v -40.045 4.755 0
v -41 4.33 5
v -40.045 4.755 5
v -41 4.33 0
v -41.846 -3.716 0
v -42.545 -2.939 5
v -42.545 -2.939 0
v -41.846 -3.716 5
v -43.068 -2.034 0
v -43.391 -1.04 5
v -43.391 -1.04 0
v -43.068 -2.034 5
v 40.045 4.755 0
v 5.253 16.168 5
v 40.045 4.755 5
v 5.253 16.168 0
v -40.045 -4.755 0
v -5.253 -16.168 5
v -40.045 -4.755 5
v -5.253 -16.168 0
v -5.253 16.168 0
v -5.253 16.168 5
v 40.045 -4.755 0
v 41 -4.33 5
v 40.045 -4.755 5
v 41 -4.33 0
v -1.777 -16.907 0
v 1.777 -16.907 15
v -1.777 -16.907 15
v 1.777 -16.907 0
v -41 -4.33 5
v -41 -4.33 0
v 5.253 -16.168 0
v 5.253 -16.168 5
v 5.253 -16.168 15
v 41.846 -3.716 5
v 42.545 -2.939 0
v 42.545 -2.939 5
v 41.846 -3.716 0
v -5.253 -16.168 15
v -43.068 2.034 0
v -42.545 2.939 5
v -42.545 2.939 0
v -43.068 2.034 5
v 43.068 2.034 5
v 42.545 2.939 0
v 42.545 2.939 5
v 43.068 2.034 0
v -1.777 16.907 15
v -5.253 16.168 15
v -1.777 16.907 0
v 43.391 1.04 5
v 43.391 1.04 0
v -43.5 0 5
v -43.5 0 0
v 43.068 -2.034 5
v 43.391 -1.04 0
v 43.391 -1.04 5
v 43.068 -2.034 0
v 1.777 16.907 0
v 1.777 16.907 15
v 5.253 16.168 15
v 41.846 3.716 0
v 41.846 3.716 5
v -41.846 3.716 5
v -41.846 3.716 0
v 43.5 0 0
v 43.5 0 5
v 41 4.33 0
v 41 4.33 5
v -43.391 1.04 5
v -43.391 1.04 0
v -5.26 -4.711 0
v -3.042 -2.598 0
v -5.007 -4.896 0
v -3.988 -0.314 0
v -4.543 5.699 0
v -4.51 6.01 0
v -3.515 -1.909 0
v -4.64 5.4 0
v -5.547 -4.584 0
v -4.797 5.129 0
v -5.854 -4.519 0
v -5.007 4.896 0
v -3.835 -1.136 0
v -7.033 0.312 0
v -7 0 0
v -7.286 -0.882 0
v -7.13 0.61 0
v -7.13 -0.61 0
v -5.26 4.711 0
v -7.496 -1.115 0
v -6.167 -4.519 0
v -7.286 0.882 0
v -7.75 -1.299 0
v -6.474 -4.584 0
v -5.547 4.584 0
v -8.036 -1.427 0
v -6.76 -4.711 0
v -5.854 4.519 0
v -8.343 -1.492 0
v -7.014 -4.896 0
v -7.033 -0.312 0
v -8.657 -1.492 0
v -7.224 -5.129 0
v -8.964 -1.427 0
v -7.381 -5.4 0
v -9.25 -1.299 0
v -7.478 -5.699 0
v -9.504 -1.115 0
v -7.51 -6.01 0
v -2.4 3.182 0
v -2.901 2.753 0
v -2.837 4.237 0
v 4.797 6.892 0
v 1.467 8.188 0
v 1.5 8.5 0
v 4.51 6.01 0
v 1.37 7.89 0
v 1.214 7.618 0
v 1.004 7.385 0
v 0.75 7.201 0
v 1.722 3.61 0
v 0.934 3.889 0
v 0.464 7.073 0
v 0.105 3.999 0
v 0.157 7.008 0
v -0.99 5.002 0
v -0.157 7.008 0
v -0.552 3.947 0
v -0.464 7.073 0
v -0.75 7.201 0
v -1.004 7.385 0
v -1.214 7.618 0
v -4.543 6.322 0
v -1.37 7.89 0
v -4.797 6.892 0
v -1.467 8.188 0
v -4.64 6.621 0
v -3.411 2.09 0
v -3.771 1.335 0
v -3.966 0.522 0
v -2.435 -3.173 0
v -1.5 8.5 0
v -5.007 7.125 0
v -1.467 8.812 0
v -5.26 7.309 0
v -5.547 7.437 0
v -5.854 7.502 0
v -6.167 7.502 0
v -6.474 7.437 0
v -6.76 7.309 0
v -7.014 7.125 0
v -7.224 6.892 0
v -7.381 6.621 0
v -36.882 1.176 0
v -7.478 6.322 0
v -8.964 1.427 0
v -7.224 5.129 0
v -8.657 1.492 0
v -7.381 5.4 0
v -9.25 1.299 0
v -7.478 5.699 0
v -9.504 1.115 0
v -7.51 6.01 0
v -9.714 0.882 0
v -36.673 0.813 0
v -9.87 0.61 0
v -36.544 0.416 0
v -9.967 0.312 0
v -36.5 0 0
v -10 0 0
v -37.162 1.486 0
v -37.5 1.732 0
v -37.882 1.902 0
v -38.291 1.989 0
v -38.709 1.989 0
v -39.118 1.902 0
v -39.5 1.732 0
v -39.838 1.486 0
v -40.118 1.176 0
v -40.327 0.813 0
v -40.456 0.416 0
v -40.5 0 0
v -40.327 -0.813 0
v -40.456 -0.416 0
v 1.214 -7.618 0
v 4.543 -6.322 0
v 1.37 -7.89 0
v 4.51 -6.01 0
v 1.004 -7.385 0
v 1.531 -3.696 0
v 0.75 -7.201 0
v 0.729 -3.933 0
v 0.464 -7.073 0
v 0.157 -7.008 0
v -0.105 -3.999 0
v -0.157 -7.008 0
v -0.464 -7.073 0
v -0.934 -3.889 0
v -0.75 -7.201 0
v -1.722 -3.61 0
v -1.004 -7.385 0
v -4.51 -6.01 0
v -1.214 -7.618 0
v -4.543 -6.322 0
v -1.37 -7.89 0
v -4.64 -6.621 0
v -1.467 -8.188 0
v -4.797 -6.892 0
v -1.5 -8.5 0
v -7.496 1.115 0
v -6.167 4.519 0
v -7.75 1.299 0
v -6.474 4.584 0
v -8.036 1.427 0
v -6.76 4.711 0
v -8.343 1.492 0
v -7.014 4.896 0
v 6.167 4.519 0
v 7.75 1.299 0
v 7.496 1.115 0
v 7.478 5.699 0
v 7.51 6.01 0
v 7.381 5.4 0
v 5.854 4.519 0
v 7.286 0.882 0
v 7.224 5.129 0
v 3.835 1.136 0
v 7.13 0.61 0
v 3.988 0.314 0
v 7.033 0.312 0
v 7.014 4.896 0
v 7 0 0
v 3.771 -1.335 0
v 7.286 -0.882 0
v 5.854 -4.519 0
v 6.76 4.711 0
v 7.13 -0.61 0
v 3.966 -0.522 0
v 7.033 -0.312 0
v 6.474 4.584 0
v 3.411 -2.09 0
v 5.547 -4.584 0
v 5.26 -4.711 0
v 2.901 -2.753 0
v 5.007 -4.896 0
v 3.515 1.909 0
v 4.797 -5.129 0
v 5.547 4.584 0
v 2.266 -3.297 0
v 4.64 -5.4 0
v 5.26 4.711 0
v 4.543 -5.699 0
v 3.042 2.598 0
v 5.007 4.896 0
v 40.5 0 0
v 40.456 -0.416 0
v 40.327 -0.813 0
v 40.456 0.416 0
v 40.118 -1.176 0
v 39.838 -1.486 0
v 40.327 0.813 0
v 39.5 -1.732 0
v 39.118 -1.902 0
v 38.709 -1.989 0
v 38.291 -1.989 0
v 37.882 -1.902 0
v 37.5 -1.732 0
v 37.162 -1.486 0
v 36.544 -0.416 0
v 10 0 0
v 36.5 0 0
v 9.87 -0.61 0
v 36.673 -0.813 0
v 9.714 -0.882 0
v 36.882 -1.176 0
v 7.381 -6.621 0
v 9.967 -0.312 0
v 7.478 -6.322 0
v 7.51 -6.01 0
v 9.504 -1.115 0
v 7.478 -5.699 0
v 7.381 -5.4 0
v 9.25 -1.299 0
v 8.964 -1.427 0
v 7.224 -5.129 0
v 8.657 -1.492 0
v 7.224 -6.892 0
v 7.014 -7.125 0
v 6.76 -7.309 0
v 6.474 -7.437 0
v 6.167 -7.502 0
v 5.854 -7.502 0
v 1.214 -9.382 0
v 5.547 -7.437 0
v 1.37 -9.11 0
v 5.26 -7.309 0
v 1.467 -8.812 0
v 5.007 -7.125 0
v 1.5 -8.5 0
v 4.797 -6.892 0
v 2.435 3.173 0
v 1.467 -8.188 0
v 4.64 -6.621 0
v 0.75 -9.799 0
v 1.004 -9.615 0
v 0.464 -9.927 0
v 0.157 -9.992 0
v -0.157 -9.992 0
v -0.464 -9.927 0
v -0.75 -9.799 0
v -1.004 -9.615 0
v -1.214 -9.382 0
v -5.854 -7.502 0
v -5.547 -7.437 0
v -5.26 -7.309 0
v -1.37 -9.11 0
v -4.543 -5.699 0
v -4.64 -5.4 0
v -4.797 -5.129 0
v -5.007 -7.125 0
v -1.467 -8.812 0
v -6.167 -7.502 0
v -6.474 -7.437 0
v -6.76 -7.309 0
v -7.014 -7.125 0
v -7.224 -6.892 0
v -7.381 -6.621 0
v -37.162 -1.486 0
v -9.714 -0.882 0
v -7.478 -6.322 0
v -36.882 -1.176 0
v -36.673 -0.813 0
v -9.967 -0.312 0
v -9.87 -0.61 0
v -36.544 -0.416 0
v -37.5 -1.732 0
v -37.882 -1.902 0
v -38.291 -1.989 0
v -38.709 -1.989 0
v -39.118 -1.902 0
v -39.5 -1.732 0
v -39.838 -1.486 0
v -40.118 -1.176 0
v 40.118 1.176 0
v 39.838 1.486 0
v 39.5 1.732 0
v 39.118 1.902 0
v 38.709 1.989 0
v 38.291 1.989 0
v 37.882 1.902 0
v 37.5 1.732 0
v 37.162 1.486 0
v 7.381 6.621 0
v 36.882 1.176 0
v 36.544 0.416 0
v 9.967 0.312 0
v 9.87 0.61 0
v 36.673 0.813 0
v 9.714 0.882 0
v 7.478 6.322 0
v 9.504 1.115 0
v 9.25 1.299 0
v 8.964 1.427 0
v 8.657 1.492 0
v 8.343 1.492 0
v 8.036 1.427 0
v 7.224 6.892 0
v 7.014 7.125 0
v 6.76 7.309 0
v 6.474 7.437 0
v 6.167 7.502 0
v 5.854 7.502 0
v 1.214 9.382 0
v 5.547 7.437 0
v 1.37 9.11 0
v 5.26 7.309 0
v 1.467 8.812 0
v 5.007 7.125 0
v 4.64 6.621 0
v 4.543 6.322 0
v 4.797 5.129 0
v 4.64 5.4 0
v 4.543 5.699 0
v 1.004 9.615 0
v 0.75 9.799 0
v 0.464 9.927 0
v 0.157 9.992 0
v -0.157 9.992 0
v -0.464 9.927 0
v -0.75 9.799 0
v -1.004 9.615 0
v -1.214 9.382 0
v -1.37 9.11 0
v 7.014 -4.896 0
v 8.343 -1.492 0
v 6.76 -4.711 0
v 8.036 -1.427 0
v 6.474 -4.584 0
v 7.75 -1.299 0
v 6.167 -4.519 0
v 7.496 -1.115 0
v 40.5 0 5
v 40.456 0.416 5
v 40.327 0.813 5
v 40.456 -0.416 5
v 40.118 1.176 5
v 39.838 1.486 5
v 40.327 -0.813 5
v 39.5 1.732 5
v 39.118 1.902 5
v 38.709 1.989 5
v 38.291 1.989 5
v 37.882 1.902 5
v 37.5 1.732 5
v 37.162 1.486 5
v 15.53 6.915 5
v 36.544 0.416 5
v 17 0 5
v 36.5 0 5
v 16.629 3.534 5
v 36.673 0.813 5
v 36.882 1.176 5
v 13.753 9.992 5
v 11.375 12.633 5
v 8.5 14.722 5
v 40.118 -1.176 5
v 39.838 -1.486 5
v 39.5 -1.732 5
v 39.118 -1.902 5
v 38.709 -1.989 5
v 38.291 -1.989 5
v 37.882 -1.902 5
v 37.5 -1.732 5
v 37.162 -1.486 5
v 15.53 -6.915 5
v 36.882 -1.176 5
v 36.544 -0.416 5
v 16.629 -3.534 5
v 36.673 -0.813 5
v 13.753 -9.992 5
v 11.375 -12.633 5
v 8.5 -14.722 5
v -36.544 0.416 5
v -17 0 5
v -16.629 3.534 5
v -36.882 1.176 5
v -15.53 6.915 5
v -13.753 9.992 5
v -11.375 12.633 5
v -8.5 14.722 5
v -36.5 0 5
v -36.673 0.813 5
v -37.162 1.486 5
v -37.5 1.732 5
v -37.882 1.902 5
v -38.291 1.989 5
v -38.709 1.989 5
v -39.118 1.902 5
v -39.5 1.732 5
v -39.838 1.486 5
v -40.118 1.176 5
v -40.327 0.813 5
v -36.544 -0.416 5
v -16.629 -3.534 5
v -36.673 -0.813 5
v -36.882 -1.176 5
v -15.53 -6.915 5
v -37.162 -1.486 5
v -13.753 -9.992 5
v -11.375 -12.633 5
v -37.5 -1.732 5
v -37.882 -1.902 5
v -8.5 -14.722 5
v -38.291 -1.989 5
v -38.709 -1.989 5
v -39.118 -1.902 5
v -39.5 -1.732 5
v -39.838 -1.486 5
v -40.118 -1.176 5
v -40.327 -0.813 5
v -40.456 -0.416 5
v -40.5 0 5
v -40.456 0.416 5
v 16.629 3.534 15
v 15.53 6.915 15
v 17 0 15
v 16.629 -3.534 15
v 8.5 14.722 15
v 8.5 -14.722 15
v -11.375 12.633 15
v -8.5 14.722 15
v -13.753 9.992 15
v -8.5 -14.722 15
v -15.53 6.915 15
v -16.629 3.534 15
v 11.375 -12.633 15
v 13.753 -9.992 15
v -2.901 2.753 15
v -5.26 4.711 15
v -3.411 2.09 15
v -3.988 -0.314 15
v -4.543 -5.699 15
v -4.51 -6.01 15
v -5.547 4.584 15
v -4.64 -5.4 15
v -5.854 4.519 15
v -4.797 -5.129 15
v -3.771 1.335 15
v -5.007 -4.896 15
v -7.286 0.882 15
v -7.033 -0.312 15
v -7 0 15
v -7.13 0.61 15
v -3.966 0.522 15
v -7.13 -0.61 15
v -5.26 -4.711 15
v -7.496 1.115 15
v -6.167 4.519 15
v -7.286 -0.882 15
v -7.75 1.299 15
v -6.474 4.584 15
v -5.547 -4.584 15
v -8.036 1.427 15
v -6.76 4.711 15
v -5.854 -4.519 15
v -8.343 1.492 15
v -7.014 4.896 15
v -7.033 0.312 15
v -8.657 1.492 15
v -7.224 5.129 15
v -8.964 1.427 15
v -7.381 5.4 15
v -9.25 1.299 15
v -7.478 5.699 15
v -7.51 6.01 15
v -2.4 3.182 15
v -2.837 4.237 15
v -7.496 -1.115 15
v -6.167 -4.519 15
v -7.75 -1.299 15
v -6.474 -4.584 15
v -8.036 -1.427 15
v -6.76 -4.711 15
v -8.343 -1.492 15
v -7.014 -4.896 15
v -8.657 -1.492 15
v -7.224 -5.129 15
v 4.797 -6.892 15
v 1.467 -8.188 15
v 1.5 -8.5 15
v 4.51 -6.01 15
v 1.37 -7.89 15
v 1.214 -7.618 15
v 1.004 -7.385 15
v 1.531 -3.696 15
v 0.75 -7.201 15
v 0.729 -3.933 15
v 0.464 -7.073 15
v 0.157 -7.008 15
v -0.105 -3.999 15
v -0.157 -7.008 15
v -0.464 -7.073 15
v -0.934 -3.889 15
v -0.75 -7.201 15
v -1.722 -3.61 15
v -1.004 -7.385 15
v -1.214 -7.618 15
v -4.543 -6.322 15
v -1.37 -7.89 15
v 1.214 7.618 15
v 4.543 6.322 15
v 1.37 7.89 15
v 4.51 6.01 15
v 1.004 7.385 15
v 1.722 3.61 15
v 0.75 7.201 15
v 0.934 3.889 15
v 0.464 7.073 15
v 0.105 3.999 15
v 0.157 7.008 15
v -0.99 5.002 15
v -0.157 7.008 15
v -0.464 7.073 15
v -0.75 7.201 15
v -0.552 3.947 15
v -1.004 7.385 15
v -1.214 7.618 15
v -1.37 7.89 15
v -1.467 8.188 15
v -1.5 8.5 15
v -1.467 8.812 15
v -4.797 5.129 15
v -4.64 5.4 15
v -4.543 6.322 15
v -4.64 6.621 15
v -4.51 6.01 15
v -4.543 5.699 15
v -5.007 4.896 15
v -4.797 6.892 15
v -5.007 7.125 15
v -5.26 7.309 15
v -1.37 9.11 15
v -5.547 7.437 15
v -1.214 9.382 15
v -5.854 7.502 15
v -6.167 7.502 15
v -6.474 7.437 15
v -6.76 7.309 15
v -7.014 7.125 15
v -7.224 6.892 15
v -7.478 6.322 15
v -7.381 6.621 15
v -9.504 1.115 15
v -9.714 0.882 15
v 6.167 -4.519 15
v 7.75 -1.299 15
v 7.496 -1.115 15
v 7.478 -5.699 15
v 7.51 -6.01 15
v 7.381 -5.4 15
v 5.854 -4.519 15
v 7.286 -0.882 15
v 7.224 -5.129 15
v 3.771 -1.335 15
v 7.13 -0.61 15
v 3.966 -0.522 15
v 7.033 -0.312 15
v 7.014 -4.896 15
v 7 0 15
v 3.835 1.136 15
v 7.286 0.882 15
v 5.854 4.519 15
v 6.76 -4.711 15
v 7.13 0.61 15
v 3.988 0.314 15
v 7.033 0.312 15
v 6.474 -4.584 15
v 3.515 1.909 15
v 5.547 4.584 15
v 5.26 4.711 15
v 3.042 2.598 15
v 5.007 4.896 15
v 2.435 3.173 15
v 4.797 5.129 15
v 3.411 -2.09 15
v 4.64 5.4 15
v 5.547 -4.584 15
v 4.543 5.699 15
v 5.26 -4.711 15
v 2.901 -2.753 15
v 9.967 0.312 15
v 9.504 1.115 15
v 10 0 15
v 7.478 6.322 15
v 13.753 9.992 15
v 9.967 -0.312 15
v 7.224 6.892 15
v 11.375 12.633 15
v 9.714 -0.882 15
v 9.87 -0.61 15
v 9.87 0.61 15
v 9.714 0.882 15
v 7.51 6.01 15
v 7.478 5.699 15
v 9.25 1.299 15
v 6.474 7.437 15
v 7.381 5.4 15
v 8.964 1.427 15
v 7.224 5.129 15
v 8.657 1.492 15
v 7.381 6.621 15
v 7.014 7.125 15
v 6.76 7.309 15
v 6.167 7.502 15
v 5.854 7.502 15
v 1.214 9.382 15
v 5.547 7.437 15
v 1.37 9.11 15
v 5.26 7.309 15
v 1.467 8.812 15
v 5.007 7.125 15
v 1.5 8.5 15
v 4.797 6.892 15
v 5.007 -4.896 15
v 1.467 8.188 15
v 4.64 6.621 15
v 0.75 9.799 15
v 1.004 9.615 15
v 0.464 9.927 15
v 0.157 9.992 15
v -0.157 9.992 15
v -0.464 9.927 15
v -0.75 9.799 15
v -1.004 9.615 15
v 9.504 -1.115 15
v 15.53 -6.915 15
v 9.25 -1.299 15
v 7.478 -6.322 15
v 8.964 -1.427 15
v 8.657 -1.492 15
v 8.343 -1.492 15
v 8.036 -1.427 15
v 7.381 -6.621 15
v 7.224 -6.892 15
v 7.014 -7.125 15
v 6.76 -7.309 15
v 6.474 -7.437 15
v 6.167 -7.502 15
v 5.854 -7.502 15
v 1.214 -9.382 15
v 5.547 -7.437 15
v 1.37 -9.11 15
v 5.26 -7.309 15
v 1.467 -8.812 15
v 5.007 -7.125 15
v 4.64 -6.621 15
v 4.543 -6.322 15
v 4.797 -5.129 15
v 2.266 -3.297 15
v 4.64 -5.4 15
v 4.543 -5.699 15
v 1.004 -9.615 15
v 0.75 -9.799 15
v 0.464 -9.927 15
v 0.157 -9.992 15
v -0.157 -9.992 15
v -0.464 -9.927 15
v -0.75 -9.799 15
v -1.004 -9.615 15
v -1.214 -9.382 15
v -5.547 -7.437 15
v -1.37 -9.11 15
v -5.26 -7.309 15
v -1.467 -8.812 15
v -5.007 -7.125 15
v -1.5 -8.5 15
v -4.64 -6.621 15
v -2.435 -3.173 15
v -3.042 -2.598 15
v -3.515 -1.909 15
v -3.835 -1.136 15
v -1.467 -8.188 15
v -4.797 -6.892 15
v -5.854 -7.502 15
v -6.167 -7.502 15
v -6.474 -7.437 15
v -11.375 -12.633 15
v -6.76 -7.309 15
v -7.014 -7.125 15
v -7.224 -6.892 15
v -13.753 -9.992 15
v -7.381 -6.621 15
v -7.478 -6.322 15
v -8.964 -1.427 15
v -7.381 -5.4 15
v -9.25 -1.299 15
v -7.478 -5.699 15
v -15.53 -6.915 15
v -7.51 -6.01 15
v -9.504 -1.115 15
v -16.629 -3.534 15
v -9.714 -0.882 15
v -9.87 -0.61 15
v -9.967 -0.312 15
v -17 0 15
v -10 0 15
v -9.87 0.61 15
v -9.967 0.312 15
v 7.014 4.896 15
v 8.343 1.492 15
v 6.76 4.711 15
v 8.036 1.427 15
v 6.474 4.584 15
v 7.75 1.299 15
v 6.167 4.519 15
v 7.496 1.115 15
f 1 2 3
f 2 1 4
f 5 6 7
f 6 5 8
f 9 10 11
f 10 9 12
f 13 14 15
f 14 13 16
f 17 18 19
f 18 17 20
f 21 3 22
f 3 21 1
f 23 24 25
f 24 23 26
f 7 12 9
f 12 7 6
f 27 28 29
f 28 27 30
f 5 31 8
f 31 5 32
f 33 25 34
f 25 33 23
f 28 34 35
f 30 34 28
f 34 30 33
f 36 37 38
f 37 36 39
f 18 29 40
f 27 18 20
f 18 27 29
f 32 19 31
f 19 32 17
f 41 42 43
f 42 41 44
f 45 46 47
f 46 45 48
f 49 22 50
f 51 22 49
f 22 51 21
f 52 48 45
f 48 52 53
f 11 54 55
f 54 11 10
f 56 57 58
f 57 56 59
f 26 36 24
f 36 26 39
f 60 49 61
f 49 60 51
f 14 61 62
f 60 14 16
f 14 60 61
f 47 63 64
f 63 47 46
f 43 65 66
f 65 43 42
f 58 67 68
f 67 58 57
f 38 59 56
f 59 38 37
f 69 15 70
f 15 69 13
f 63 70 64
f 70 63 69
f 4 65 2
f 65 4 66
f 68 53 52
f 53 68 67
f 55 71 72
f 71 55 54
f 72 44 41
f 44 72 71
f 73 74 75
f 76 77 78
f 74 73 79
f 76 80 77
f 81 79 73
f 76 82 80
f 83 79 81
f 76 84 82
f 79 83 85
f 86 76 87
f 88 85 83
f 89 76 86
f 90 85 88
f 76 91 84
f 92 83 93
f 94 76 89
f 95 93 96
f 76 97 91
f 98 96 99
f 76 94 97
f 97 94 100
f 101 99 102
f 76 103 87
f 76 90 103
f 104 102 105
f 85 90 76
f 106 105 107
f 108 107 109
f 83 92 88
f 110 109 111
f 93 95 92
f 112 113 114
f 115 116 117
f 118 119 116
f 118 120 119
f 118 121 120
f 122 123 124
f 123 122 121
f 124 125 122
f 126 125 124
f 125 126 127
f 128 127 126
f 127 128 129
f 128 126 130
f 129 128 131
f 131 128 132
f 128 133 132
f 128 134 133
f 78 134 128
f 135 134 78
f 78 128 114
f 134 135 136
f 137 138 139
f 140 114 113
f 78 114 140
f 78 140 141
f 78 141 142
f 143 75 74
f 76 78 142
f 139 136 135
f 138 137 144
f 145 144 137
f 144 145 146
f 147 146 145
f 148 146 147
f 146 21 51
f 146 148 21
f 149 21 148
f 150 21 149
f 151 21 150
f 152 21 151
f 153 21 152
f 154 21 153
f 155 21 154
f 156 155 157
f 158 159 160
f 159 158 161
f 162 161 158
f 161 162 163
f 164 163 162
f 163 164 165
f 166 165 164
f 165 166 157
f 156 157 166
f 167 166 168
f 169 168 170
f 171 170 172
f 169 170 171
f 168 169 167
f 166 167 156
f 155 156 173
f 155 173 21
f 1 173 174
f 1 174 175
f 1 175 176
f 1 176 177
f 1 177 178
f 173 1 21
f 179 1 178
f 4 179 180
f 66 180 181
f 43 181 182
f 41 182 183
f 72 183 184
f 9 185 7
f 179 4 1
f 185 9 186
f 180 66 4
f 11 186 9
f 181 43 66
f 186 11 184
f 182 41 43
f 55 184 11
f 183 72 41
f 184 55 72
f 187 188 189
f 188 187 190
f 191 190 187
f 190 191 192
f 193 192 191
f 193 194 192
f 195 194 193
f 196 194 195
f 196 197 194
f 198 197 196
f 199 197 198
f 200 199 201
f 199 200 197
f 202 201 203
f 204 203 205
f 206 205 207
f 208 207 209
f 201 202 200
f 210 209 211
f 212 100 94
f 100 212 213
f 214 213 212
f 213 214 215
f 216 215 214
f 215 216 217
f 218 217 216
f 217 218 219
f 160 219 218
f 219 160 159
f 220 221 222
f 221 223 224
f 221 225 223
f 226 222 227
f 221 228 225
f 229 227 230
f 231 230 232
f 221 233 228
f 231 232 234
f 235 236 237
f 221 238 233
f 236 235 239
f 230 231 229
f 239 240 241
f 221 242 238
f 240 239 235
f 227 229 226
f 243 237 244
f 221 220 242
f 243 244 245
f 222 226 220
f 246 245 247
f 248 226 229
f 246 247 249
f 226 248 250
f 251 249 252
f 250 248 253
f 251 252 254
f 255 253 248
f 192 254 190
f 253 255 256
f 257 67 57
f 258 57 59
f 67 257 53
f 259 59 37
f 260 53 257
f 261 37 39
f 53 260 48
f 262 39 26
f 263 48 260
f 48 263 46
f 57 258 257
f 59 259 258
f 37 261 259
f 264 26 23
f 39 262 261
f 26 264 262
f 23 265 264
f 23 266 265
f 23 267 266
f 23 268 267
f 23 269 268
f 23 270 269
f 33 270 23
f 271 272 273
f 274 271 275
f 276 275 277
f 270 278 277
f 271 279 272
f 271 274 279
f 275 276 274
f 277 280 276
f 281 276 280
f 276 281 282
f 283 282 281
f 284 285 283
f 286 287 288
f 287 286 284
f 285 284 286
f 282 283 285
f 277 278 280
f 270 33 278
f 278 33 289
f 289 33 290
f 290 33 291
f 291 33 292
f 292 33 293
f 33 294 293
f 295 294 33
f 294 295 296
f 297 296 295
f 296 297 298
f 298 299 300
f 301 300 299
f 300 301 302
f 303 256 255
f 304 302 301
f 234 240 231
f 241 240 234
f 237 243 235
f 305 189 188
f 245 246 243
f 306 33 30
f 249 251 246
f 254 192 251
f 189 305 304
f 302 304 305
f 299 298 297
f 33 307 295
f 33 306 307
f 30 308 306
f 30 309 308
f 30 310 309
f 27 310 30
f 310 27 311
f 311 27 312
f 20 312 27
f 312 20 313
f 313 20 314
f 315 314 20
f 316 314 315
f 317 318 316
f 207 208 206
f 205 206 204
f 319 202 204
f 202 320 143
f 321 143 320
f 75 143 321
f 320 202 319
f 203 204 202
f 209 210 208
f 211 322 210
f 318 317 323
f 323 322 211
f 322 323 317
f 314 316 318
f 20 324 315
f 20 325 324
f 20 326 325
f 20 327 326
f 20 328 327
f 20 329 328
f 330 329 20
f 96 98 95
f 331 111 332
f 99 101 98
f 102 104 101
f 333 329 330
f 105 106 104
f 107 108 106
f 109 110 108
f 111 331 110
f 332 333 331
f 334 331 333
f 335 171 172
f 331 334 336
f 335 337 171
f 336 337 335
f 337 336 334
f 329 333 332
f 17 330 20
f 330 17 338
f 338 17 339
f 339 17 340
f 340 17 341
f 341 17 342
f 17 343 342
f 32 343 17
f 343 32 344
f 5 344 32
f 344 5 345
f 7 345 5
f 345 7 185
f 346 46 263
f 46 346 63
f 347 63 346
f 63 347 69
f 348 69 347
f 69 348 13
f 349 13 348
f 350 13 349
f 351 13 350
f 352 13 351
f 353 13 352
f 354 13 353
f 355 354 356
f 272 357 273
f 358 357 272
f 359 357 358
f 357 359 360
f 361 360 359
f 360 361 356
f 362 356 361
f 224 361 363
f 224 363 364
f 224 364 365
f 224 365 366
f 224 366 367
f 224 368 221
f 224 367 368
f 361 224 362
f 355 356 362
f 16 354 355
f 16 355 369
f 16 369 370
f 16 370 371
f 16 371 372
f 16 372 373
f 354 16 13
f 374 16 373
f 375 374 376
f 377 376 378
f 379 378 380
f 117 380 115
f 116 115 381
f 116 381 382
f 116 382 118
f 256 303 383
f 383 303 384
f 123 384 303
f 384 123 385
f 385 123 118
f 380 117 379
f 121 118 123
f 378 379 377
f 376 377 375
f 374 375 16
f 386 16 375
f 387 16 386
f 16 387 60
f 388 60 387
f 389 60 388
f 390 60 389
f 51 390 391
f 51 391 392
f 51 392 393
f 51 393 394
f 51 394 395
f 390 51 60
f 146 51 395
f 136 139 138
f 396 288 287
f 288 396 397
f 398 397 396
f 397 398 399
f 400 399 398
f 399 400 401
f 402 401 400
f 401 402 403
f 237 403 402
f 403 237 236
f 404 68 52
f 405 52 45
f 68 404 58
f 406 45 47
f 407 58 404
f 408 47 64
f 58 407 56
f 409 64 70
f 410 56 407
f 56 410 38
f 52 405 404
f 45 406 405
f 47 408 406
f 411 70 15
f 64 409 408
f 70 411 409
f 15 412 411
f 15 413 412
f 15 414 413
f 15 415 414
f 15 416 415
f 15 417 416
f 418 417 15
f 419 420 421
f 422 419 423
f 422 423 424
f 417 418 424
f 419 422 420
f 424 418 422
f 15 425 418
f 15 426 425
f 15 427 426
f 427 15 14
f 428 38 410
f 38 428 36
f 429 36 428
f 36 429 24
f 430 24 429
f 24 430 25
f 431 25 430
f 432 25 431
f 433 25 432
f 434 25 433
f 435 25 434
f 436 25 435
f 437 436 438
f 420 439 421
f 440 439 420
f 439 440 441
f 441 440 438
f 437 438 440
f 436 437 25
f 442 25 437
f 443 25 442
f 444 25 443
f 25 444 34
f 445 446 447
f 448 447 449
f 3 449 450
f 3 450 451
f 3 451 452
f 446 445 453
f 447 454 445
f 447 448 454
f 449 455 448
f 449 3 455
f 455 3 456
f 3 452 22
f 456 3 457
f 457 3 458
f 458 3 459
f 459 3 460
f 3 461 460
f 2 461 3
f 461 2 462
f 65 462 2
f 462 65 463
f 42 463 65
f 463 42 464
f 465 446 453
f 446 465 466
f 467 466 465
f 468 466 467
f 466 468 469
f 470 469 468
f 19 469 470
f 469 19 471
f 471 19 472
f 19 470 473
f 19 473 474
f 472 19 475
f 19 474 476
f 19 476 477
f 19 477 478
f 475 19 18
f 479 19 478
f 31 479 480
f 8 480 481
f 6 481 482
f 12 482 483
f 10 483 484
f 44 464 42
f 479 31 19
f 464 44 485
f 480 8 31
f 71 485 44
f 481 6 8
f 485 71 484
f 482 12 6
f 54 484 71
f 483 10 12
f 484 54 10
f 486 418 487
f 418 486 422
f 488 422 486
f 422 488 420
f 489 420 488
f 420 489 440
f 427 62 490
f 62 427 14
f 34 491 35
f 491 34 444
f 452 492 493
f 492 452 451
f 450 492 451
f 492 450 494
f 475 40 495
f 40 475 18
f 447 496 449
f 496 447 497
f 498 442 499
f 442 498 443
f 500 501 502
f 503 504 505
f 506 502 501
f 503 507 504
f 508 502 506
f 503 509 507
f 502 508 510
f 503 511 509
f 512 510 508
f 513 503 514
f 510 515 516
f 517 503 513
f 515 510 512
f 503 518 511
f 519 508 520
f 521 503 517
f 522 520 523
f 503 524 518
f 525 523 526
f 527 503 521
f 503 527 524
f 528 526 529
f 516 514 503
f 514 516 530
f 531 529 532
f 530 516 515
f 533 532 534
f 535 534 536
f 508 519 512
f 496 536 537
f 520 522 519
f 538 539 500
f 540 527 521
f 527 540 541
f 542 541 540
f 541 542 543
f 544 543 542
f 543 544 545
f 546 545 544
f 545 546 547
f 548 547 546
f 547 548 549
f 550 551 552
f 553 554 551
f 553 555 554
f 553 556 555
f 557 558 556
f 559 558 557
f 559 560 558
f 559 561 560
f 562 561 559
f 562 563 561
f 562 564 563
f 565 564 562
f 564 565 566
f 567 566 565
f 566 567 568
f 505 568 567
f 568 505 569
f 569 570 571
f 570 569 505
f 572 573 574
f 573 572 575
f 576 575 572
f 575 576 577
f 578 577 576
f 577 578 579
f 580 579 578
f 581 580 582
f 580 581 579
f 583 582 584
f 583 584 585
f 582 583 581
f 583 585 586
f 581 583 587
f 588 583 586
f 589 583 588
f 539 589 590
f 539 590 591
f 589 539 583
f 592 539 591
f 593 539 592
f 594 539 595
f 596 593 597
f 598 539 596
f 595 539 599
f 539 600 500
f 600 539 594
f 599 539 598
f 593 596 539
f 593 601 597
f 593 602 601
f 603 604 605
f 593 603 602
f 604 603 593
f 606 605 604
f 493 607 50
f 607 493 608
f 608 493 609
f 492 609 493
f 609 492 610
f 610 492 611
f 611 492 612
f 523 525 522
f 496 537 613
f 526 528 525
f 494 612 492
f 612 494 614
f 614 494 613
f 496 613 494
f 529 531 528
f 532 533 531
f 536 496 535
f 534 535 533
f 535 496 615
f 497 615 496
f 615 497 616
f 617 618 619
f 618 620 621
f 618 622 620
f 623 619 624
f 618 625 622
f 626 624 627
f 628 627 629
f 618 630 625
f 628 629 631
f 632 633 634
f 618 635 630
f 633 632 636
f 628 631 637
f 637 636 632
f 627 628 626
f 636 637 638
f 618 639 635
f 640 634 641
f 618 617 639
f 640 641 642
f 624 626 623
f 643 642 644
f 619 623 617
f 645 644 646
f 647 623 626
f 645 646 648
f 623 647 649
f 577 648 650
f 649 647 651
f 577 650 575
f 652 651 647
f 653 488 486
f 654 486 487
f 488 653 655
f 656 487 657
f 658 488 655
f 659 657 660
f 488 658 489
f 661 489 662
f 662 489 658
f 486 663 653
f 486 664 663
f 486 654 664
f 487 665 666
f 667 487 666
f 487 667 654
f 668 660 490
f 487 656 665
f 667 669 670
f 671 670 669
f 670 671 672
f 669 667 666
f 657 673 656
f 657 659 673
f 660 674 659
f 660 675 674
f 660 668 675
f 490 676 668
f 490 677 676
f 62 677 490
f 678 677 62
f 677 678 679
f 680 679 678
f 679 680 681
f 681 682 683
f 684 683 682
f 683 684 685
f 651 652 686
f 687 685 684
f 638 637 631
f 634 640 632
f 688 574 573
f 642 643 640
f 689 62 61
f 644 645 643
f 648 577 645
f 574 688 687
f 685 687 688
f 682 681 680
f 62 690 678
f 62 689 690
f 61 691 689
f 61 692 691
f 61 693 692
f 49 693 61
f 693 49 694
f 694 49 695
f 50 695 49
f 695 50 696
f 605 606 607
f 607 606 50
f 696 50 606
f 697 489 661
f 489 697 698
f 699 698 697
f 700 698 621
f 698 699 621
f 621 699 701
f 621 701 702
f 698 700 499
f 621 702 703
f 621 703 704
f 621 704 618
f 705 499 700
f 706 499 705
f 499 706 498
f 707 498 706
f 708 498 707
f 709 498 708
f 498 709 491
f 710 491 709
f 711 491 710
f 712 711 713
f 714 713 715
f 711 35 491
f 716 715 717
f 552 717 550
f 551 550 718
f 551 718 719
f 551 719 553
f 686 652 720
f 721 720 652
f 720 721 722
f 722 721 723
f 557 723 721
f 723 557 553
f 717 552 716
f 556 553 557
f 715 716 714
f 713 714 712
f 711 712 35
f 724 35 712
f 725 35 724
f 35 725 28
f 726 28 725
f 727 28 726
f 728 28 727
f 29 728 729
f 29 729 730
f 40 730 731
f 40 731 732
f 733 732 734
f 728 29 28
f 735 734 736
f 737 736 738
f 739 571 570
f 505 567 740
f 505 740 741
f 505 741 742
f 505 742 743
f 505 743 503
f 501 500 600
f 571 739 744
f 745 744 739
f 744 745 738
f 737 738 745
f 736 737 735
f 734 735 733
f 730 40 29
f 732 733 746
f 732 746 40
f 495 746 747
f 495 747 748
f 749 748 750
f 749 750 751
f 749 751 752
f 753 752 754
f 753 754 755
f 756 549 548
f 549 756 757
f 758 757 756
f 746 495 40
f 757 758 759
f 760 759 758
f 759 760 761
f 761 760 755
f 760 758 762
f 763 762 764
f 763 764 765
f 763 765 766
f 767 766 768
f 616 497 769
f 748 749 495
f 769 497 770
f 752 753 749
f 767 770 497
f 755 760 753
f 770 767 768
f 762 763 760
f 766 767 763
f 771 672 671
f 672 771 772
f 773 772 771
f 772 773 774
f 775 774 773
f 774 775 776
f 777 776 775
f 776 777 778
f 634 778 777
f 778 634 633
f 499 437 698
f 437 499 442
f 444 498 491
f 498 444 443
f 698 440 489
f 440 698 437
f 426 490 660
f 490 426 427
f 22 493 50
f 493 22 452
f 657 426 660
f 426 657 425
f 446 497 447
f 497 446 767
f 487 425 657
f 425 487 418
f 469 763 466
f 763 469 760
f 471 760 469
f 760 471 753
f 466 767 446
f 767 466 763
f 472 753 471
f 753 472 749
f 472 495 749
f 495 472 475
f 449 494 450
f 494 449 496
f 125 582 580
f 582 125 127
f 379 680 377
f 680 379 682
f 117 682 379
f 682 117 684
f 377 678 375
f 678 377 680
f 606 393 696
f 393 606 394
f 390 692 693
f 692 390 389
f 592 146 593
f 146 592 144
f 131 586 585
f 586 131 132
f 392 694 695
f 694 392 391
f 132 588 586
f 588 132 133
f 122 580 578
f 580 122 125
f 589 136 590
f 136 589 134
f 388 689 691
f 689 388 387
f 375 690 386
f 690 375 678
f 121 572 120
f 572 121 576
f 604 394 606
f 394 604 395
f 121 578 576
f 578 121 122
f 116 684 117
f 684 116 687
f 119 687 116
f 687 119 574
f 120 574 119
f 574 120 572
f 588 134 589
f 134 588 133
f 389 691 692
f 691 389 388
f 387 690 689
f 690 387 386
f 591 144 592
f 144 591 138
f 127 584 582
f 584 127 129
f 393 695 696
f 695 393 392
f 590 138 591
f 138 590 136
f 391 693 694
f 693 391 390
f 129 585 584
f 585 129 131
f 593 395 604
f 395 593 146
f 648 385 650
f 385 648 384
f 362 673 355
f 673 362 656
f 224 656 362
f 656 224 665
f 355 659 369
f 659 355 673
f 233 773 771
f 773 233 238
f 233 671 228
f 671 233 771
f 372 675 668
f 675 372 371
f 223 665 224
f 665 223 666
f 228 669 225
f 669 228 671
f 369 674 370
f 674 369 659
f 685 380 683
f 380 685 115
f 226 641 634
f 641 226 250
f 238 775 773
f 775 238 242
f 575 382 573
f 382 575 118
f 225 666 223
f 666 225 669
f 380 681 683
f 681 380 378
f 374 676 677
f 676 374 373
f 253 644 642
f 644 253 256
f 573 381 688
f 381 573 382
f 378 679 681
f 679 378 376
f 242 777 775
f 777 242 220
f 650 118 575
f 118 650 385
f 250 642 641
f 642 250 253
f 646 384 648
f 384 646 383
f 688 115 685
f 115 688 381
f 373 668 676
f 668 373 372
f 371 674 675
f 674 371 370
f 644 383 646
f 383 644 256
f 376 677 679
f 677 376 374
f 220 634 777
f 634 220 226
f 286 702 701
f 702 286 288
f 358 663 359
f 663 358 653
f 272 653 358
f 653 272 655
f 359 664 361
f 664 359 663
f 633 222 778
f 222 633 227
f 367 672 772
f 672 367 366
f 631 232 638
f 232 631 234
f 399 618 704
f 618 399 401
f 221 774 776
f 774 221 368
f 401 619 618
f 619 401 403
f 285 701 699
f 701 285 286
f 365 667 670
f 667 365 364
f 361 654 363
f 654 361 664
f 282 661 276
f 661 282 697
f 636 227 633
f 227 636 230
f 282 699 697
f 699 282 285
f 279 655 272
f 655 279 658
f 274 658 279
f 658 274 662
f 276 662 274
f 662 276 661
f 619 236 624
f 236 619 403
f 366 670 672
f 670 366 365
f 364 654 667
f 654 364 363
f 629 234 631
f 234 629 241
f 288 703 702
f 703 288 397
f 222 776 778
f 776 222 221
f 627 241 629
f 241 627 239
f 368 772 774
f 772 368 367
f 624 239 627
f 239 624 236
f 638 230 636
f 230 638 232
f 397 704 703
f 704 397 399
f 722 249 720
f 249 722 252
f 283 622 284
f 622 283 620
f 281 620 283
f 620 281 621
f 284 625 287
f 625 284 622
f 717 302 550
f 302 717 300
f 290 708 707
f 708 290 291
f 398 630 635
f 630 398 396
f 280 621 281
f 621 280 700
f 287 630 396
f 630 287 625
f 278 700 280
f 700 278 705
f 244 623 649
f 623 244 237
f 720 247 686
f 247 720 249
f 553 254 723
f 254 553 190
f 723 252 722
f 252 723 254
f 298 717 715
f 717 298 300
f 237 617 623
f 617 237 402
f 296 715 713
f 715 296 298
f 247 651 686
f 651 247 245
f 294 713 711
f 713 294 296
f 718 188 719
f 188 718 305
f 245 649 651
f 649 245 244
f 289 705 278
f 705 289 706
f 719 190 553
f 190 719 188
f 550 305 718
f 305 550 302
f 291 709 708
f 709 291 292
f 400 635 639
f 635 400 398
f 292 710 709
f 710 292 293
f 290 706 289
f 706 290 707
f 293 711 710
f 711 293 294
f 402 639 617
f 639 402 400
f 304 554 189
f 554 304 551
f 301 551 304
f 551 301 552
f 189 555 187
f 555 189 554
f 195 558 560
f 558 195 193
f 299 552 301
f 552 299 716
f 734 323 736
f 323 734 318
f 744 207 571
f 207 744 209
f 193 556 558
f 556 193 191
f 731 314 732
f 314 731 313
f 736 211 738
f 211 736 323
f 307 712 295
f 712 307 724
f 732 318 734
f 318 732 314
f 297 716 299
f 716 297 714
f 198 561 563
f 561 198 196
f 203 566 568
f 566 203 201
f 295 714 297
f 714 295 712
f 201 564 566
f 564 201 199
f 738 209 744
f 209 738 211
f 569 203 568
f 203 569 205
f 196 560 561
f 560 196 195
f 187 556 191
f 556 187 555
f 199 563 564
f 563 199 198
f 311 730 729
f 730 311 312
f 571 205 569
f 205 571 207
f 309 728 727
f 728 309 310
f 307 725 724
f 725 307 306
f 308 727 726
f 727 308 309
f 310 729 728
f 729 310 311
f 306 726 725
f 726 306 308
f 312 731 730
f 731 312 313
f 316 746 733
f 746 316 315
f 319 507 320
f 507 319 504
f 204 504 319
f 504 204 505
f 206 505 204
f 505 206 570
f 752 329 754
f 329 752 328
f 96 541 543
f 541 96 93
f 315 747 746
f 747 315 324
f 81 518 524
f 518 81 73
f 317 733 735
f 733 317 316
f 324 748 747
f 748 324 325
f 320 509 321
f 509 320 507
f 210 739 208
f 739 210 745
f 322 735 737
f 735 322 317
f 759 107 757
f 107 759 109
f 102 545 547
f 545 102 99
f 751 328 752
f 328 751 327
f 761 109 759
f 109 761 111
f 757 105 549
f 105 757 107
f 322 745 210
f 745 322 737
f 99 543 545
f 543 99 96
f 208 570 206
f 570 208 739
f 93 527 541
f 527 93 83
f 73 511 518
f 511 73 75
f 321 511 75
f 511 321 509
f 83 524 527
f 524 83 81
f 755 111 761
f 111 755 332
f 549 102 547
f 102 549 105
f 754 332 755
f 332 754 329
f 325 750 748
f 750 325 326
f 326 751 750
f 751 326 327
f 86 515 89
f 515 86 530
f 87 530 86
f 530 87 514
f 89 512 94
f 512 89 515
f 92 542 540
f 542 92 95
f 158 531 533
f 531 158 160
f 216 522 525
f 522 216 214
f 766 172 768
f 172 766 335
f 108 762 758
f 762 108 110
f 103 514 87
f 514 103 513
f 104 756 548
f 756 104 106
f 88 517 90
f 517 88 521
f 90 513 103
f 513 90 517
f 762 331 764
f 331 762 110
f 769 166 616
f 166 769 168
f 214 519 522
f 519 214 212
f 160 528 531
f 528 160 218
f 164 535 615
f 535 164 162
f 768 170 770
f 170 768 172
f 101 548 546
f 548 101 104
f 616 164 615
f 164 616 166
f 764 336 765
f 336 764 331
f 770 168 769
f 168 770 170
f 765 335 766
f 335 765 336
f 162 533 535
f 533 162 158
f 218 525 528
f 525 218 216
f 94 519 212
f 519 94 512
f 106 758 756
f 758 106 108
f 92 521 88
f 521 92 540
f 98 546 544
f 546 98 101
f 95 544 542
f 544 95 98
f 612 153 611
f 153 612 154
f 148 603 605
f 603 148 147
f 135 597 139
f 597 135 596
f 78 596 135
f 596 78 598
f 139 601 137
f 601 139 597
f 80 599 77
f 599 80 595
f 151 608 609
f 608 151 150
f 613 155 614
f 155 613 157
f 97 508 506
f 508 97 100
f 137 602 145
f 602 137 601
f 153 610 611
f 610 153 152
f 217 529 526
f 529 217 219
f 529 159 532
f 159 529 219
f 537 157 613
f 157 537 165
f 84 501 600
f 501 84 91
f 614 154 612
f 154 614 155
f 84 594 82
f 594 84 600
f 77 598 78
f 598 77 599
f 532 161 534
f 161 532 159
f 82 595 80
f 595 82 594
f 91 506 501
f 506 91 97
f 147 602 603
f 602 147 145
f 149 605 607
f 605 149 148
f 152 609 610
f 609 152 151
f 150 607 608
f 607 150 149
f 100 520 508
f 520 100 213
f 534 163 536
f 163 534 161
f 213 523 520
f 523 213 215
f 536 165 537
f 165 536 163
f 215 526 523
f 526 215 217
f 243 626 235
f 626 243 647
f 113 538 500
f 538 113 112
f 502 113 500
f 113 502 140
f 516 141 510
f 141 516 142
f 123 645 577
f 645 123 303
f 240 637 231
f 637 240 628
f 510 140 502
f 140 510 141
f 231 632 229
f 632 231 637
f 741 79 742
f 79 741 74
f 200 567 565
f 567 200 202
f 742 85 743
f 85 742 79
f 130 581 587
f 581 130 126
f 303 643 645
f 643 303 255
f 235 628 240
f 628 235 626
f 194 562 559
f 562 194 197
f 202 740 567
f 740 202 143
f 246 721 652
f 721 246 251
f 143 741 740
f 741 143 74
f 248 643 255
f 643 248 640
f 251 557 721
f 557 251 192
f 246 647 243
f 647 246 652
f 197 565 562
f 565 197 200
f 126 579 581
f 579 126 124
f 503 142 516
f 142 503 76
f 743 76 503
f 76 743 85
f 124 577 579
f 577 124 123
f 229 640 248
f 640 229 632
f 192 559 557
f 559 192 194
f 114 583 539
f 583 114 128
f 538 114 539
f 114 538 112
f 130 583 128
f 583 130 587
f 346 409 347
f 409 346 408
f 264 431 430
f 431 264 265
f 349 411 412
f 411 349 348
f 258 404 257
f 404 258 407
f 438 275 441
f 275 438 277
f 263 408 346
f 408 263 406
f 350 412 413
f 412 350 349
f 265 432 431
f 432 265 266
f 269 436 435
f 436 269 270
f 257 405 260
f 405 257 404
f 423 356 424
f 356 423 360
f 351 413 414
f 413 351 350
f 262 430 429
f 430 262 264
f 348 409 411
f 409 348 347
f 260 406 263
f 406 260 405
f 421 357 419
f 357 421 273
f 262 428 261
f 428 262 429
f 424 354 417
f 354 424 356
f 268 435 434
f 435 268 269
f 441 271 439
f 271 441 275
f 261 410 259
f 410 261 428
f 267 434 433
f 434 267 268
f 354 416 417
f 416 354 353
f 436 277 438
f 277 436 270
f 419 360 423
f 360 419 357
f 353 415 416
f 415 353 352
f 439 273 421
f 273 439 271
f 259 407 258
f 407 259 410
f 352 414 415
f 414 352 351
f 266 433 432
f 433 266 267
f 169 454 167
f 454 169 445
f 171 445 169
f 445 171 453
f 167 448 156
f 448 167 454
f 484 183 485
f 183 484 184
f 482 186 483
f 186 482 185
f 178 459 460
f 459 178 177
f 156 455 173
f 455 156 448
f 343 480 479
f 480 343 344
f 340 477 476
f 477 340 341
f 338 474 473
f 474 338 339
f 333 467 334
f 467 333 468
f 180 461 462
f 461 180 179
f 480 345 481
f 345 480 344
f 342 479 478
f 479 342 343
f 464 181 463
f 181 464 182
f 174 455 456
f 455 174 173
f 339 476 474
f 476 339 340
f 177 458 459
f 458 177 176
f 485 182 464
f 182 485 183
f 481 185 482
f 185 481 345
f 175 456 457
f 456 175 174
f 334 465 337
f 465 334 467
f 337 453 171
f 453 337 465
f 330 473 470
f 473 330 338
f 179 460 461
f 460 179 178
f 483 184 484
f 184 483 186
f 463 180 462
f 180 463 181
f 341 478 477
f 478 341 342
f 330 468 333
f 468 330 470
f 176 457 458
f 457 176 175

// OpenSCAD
/*
Create a tube socket for 3D printing
By: Dave Borghuis / zeno4ever
Version : 1.2
Date : 22-01-2012
For sugestions email me at : zeno4ever@gmail.com

22-01-12 Added Notch option/parameters
18-01-12 Initial version
30-01-12 Make script better for use in Customizer (by Makerbot)

Usage : at least change the Socket dimensions and pin size. The rest of the 
parameter can be changed to, this defaults should be reasonable.

All $r is radius, you can enter diameter/2 

Current parameters are for a octal base tube socket
*/

//All sizes in mm
socket_hight = 15 ;
socket_radius = 17;

pin_radius = 1.5;

//How many holes
pin_numbers = 8; //[1:32]

//Distance from center
pin_distance = 8.5 ; 

//Enable center hole, 0 to disable hole & notch
center_radius = 4; 
//0 to disable
notch_size = 2;
notch_position =  112.5; //[1:360]
notch_distance = center_radius;

//Resolution of model
$fs = 0.01*1; 

// Create Tube Socet 
difference() {
	//Create footer
	union() {
		hull() {
	  		translate([77/2,0,0]) cylinder(5,10/2,10/2);
      		translate([0,0,0]) cylinder(5,socket_radius,socket_radius);
	  		translate([-77/2,0,0]) cylinder(5,10/2,10/2);	
		}
		translate([0,0,5]) cylinder(socket_hight-5 , socket_radius, socket_radius);
	}
	//Create all holes
	for (i = [0:pin_numbers-1]) { //create holes
		//echo(360*i/6, sin(360*i/6)*80, cos(360*i/6)*80);
		translate([sin(360*i/pin_numbers)*pin_distance, cos(360*i/pin_numbers)*pin_distance, 0 ])
		cylinder(socket_hight*2, pin_radius,pin_radius); 
	}

	//Exaple if you want to put a pin at some 'random' position
	//replace the 90 in next line for the position
	//translate([sin(90)*pin_distance, cos(90)*pin_distance, 0 ]) cylinder(socket_hight, pin_radius,pin_radius); 
	
	//Create center hole/notch
	if (center_radius>0) { //if centerhole 
		if (notch_size!=0) //and notch {
			rotate(a=[0,0,notch_position])
			union() {
				cylinder(socket_hight*2,center_radius,center_radius); //Center pin
				translate([notch_distance,0, 0 ]) cube(size=[notch_size,notch_size,socket_hight*2], center=true); //Notch
				} 
		} else {
			cylinder(socket_hight*2,center_radius,center_radius); //Only center pin
	}


	//holes in the footer
	translate([77/2,0,0]) cylinder(socket_hight*2,2,2); 
	translate([-77/2,0,0]) cylinder(socket_hight*2,2,2); 	
}
